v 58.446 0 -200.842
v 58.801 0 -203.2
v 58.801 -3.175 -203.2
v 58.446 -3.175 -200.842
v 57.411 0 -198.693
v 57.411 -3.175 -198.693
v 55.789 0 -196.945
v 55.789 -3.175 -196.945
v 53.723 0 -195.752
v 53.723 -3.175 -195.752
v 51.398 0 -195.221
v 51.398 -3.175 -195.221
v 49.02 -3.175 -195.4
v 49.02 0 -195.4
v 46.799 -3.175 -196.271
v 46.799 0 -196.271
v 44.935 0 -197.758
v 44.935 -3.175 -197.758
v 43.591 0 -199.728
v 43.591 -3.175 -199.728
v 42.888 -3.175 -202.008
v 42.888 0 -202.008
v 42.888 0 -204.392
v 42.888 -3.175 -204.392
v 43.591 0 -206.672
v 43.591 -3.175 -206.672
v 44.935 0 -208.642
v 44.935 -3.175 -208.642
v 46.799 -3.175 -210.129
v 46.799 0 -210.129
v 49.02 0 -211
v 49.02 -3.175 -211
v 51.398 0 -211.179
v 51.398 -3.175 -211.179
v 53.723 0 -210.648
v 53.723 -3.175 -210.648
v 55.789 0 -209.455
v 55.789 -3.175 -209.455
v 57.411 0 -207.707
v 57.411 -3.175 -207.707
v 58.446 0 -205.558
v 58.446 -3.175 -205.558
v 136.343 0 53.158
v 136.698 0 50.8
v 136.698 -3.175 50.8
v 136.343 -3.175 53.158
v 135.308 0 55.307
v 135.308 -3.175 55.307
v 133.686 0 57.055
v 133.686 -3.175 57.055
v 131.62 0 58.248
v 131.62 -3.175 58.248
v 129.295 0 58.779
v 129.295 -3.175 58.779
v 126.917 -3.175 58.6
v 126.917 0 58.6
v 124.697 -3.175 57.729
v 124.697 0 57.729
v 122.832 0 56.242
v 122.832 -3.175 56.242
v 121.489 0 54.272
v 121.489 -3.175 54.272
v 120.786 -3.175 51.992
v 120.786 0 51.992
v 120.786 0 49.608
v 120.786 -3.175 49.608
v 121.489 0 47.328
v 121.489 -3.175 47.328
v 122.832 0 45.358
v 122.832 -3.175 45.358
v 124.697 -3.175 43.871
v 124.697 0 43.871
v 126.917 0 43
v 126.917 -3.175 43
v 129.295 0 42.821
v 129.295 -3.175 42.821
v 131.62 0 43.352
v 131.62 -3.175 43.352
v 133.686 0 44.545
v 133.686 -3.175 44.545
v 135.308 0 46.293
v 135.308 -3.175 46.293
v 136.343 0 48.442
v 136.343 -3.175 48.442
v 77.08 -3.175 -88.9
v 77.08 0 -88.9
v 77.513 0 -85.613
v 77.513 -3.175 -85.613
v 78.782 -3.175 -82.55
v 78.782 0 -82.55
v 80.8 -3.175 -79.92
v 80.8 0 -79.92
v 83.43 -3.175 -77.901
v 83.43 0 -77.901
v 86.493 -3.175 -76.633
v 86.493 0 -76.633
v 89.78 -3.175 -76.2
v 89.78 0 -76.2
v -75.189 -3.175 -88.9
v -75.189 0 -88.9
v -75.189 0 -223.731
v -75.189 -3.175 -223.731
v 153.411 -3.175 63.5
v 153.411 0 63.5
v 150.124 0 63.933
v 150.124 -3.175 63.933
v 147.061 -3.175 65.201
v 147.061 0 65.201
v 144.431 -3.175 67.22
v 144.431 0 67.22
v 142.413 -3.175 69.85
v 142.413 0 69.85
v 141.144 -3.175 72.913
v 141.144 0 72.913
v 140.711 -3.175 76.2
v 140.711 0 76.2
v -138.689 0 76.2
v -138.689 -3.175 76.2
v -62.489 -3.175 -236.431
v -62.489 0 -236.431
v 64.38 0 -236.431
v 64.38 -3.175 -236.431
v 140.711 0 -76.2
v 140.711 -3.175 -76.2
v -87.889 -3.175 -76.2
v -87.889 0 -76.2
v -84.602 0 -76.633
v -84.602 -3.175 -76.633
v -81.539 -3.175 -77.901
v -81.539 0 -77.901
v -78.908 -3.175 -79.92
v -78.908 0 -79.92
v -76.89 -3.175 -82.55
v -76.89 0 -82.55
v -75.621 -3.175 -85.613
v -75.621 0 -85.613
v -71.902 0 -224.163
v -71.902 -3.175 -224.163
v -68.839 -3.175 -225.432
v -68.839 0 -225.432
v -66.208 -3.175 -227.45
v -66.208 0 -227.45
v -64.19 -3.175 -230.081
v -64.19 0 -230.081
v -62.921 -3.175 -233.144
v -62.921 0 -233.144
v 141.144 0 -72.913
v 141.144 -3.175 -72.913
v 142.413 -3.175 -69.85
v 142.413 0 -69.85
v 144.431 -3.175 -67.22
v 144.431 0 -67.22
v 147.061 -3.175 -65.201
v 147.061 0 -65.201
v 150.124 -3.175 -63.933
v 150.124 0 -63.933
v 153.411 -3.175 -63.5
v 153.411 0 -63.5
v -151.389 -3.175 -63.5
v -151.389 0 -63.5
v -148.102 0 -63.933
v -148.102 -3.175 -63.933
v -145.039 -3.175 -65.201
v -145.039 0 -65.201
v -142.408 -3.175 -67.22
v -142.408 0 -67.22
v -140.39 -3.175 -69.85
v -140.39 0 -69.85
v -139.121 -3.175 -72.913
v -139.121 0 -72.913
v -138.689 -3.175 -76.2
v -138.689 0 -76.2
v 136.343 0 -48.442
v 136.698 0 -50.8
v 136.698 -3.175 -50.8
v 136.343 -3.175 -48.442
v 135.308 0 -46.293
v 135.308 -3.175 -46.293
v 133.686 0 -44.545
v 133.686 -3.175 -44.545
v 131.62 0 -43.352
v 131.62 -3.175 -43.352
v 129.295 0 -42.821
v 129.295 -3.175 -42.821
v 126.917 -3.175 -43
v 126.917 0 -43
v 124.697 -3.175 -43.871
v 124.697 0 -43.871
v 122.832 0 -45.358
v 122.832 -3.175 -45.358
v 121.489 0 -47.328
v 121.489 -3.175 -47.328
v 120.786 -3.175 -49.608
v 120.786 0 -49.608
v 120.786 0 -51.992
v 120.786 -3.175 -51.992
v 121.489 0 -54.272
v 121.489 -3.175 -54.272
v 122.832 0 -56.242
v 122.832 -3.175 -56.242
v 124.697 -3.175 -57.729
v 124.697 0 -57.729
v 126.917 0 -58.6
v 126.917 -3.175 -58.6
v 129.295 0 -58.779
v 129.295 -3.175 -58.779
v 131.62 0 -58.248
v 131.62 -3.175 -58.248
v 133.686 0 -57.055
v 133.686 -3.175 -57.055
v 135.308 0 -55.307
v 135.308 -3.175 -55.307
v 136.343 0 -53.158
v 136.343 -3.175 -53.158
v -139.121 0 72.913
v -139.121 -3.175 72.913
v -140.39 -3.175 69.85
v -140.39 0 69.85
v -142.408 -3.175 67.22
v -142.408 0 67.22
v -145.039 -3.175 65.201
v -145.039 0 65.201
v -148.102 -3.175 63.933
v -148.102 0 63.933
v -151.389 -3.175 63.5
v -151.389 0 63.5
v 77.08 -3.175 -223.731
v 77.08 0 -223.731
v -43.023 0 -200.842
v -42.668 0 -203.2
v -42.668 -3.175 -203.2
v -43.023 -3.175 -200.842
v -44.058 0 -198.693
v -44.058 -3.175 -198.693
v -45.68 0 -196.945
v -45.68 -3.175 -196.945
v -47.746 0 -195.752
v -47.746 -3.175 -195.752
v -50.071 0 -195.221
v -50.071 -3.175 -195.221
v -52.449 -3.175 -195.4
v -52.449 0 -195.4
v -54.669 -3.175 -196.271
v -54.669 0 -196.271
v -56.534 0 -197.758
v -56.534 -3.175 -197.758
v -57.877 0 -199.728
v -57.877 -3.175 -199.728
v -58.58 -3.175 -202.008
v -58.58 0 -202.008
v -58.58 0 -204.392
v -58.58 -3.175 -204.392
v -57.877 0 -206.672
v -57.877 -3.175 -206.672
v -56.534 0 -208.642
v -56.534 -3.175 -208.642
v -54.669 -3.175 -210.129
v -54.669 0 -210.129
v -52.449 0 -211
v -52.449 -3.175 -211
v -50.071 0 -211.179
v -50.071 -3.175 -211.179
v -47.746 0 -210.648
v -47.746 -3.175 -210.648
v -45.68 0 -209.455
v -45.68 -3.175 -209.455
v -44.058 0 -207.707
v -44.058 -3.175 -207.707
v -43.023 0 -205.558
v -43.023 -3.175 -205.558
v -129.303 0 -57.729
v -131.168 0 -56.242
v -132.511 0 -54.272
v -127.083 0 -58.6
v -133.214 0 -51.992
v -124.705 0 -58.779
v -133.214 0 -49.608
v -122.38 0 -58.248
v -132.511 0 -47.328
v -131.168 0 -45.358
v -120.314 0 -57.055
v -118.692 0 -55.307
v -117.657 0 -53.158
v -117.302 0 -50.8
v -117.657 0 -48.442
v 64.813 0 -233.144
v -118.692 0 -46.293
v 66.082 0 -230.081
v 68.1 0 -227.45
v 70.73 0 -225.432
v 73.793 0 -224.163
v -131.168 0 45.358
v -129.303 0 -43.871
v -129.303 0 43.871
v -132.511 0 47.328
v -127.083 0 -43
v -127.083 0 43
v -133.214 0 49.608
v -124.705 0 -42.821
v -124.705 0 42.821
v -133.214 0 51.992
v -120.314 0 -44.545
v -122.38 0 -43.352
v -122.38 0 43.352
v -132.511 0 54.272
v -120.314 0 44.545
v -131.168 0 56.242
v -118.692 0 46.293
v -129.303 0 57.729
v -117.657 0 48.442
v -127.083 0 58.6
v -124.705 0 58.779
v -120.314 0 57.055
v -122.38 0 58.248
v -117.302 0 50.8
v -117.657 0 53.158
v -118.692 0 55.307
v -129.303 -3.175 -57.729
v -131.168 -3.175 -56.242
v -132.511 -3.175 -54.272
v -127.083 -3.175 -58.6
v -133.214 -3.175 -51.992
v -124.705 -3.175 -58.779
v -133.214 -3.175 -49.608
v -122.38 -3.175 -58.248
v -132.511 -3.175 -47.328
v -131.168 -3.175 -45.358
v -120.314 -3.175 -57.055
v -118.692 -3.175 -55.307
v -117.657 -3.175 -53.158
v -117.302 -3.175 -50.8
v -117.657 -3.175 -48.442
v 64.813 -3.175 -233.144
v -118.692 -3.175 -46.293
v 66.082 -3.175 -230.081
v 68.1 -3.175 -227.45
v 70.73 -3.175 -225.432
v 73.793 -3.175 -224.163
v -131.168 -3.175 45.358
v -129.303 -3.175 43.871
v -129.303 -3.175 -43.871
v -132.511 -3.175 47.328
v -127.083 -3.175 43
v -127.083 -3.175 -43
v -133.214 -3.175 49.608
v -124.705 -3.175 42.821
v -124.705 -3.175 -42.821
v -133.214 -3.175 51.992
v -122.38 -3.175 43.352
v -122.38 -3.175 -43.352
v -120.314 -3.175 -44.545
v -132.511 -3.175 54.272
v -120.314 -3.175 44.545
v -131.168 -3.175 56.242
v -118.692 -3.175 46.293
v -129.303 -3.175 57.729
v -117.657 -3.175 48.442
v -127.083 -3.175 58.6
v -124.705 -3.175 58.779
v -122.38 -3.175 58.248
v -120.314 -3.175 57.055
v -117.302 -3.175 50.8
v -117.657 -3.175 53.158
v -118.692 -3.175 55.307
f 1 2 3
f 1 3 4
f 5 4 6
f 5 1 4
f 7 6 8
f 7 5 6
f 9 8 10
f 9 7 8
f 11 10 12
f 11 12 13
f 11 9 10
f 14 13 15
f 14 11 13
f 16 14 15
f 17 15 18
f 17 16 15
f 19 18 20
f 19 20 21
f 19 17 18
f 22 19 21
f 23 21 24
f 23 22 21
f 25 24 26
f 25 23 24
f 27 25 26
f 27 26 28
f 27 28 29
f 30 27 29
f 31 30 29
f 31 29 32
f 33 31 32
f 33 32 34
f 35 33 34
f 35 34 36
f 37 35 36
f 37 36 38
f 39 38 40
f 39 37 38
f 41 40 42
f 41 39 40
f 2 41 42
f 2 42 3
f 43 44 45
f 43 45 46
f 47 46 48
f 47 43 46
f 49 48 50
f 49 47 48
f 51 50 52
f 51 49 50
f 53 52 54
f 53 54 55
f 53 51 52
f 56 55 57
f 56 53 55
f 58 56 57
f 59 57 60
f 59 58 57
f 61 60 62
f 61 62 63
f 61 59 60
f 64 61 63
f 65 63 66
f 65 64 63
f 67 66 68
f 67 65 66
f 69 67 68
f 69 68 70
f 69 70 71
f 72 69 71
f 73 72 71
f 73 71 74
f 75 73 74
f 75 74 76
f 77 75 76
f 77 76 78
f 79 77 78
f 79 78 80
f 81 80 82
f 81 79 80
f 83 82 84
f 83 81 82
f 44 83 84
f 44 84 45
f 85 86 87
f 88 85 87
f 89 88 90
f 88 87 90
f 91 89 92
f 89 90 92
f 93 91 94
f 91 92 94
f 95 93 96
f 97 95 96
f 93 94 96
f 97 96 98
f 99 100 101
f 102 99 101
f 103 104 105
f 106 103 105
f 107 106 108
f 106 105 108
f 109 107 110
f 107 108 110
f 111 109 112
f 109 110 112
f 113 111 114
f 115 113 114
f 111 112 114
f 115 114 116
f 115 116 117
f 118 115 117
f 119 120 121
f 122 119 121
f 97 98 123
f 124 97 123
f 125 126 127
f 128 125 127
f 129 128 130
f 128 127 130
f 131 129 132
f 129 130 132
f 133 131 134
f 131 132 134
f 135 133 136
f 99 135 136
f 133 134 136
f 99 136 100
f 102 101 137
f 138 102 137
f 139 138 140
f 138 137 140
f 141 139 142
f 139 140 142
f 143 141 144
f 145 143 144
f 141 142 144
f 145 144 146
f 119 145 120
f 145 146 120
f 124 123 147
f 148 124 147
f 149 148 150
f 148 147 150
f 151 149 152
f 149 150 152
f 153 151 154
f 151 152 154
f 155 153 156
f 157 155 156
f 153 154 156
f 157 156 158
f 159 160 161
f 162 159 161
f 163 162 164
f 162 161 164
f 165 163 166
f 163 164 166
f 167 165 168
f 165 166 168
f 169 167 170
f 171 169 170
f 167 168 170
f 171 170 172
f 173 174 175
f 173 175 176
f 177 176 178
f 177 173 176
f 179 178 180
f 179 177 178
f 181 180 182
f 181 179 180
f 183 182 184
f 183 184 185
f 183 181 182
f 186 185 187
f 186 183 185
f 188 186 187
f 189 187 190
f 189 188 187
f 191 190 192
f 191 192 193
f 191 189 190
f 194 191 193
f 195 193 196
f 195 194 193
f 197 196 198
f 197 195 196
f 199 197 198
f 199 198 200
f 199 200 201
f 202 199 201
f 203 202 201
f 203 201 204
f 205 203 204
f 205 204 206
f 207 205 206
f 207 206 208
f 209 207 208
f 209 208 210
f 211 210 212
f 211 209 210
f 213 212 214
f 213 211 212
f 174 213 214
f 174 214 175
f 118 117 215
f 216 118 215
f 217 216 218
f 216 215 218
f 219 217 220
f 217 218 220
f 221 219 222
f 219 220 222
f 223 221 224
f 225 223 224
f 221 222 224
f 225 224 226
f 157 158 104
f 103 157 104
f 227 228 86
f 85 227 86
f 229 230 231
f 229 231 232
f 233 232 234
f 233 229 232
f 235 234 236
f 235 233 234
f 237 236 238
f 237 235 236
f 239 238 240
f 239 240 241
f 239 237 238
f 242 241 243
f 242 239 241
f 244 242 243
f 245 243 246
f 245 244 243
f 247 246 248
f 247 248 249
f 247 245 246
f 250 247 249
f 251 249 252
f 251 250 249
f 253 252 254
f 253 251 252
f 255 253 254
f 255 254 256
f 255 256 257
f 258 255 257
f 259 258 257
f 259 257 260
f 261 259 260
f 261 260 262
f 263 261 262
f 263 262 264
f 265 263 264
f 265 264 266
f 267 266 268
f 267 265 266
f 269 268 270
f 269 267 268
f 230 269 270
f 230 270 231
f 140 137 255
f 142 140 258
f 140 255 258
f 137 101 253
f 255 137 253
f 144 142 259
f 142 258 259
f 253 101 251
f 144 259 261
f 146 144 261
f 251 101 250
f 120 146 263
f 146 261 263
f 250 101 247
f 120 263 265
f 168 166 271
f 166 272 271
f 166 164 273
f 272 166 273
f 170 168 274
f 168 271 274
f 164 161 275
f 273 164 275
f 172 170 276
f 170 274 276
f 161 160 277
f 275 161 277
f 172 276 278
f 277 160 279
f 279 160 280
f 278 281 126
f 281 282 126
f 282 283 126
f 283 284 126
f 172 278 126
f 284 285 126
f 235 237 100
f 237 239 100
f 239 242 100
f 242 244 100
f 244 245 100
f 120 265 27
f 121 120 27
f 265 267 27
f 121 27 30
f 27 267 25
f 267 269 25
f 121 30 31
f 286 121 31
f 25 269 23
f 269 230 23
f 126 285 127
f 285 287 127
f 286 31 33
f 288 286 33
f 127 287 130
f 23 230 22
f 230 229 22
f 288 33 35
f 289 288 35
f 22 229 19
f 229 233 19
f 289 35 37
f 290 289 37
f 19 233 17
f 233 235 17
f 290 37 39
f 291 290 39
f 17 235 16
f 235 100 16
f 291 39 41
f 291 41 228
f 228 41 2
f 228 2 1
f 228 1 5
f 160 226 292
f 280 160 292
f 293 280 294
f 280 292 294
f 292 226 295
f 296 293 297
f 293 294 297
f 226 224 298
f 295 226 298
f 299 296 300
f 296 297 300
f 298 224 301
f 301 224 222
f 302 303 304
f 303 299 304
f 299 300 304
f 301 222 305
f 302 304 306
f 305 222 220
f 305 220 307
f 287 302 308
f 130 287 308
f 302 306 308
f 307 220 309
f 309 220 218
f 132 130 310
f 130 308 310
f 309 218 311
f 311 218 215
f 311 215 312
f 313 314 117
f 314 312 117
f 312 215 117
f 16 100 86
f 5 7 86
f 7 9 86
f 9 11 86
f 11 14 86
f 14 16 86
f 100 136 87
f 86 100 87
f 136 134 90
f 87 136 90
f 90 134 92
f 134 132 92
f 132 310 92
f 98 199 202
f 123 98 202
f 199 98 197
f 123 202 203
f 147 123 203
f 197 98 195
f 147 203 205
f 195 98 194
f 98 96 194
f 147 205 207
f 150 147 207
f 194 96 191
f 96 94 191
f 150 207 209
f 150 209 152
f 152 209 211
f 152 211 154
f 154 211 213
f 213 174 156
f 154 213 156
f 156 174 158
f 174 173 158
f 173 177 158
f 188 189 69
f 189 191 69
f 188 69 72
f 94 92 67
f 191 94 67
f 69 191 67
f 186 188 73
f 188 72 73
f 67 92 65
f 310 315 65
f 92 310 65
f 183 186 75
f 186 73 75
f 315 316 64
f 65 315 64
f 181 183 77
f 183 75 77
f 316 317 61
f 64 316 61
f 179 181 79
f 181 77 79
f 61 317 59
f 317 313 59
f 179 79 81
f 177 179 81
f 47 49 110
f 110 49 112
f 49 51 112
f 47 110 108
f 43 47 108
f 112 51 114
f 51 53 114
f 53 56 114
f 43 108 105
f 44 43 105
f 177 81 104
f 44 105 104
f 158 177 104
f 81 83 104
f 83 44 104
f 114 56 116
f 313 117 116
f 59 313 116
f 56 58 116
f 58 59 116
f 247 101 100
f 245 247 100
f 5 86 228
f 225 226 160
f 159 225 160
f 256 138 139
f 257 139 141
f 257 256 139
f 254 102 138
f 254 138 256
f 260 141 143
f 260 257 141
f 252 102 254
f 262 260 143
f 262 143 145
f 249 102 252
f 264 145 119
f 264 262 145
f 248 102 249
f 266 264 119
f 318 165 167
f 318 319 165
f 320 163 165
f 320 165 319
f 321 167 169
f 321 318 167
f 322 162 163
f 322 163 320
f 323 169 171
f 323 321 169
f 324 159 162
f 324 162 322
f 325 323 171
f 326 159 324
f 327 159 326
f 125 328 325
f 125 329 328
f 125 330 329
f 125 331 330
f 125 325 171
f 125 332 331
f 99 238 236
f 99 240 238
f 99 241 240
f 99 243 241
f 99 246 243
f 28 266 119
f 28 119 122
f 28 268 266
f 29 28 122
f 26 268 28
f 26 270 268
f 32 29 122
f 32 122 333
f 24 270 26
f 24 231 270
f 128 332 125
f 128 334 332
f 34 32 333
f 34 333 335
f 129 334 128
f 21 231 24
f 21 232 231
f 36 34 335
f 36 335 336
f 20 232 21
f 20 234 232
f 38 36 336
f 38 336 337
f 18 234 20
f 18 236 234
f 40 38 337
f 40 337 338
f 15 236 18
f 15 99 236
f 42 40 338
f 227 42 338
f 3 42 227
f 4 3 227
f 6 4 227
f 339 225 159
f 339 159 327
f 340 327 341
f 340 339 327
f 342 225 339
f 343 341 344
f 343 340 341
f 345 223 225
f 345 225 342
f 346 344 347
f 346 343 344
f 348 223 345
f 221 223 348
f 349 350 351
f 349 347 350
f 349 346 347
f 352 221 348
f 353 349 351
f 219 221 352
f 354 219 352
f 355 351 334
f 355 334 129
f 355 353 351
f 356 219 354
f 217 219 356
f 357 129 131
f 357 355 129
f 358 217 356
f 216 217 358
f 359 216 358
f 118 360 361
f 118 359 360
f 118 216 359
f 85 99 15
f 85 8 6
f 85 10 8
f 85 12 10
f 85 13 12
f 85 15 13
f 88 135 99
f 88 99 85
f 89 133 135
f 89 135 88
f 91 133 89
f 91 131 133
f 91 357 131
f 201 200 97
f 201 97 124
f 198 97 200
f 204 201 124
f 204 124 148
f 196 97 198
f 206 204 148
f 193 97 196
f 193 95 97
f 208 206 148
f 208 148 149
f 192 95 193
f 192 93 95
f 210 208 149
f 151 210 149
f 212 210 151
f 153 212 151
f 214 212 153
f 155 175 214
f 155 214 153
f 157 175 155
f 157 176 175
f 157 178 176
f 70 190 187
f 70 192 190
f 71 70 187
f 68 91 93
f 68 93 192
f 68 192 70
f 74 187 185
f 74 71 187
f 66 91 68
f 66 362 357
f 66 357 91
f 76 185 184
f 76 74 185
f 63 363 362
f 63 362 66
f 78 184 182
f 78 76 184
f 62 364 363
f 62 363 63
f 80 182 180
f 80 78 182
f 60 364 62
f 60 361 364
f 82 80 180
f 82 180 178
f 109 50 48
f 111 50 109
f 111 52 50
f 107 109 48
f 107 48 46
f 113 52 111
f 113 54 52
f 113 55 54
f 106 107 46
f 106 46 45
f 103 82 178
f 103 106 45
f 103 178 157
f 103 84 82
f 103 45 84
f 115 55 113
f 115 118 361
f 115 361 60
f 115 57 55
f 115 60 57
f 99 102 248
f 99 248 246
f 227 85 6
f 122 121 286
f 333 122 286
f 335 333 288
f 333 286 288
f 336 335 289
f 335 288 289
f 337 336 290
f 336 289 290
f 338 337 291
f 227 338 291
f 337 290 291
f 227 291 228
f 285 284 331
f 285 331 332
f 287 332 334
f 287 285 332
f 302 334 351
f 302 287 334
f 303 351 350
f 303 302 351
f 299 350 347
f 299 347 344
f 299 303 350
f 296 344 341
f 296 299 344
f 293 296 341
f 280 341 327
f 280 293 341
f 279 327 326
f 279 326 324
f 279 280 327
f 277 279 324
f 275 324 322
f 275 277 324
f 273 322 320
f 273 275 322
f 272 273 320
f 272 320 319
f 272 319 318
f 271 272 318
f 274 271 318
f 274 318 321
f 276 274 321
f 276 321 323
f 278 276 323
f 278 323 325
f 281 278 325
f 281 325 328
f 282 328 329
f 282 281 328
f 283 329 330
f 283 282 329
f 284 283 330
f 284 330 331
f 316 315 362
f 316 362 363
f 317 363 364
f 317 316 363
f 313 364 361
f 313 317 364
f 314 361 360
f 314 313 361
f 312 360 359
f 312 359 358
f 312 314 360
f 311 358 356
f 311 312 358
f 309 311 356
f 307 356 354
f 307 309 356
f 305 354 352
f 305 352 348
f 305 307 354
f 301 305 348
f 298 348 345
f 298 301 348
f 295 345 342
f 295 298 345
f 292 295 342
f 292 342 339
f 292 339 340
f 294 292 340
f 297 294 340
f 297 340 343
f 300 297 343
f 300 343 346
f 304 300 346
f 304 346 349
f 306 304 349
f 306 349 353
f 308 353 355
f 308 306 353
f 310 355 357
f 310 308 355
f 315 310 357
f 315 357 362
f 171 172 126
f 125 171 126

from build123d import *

# Parameters (mm, degrees)
F0_R     = 8.001
F1_DEPTH = 3.175


with BuildPart() as f1:
    # F0 (on Front) → F1 (new body)
    with BuildSketch(Plane.XZ):
        with BuildLine():
            ThreePointArc((153.411418, 63.5), (144.431162, 67.219744), (140.711418, 76.2))
            Line((140.711418, 76.2), (-138.688582, 76.2))
            ThreePointArc((-138.688582, 76.2), (-142.408326, 67.219744), (-151.388582, 63.5))
            Line((-151.388582, 63.5), (-151.388582, -63.5))
            ThreePointArc((-151.388582, -63.5), (-142.408326, -67.219744), (-138.688582, -76.2))
            Line((-138.688582, -76.2), (-87.888582, -76.2))
            ThreePointArc((-87.888582, -76.2), (-78.908326, -79.919744), (-75.188582, -88.9))
            Line((-75.188582, -88.9), (-75.188582, -223.730639))
            ThreePointArc((-75.188582, -223.730639), (-66.208326, -227.450383), (-62.488582, -236.430639))
            Line((-62.488582, -236.430639), (64.380207, -236.430639))
            ThreePointArc((64.380207, -236.430639), (68.099951, -227.450383), (77.080207, -223.730639))
            Line((77.080207, -223.730639), (77.080207, -88.9))
            ThreePointArc((77.080207, -88.9), (80.799951, -79.919744), (89.780207, -76.2))
            Line((89.780207, -76.2), (140.711418, -76.2))
            ThreePointArc((140.711418, -76.2), (144.431162, -67.219744), (153.411418, -63.5))
            Line((153.411418, -63.5), (153.411418, 63.5))
        make_face()
        with Locations((-50.668789, -203.2)):
            Circle(F0_R, mode=Mode.SUBTRACT)
        with Locations((50.8, -203.2)):
            Circle(F0_R, mode=Mode.SUBTRACT)
        with Locations((-125.302818, -50.8)):
            Circle(F0_R, mode=Mode.SUBTRACT)
        with Locations((-125.302818, 50.8)):
            Circle(F0_R, mode=Mode.SUBTRACT)
        with Locations((128.697182, -50.8)):
            Circle(F0_R, mode=Mode.SUBTRACT)
        with Locations((128.697182, 50.8)):
            Circle(F0_R, mode=Mode.SUBTRACT)
    extrude(amount=F1_DEPTH)


solid = f1.part
